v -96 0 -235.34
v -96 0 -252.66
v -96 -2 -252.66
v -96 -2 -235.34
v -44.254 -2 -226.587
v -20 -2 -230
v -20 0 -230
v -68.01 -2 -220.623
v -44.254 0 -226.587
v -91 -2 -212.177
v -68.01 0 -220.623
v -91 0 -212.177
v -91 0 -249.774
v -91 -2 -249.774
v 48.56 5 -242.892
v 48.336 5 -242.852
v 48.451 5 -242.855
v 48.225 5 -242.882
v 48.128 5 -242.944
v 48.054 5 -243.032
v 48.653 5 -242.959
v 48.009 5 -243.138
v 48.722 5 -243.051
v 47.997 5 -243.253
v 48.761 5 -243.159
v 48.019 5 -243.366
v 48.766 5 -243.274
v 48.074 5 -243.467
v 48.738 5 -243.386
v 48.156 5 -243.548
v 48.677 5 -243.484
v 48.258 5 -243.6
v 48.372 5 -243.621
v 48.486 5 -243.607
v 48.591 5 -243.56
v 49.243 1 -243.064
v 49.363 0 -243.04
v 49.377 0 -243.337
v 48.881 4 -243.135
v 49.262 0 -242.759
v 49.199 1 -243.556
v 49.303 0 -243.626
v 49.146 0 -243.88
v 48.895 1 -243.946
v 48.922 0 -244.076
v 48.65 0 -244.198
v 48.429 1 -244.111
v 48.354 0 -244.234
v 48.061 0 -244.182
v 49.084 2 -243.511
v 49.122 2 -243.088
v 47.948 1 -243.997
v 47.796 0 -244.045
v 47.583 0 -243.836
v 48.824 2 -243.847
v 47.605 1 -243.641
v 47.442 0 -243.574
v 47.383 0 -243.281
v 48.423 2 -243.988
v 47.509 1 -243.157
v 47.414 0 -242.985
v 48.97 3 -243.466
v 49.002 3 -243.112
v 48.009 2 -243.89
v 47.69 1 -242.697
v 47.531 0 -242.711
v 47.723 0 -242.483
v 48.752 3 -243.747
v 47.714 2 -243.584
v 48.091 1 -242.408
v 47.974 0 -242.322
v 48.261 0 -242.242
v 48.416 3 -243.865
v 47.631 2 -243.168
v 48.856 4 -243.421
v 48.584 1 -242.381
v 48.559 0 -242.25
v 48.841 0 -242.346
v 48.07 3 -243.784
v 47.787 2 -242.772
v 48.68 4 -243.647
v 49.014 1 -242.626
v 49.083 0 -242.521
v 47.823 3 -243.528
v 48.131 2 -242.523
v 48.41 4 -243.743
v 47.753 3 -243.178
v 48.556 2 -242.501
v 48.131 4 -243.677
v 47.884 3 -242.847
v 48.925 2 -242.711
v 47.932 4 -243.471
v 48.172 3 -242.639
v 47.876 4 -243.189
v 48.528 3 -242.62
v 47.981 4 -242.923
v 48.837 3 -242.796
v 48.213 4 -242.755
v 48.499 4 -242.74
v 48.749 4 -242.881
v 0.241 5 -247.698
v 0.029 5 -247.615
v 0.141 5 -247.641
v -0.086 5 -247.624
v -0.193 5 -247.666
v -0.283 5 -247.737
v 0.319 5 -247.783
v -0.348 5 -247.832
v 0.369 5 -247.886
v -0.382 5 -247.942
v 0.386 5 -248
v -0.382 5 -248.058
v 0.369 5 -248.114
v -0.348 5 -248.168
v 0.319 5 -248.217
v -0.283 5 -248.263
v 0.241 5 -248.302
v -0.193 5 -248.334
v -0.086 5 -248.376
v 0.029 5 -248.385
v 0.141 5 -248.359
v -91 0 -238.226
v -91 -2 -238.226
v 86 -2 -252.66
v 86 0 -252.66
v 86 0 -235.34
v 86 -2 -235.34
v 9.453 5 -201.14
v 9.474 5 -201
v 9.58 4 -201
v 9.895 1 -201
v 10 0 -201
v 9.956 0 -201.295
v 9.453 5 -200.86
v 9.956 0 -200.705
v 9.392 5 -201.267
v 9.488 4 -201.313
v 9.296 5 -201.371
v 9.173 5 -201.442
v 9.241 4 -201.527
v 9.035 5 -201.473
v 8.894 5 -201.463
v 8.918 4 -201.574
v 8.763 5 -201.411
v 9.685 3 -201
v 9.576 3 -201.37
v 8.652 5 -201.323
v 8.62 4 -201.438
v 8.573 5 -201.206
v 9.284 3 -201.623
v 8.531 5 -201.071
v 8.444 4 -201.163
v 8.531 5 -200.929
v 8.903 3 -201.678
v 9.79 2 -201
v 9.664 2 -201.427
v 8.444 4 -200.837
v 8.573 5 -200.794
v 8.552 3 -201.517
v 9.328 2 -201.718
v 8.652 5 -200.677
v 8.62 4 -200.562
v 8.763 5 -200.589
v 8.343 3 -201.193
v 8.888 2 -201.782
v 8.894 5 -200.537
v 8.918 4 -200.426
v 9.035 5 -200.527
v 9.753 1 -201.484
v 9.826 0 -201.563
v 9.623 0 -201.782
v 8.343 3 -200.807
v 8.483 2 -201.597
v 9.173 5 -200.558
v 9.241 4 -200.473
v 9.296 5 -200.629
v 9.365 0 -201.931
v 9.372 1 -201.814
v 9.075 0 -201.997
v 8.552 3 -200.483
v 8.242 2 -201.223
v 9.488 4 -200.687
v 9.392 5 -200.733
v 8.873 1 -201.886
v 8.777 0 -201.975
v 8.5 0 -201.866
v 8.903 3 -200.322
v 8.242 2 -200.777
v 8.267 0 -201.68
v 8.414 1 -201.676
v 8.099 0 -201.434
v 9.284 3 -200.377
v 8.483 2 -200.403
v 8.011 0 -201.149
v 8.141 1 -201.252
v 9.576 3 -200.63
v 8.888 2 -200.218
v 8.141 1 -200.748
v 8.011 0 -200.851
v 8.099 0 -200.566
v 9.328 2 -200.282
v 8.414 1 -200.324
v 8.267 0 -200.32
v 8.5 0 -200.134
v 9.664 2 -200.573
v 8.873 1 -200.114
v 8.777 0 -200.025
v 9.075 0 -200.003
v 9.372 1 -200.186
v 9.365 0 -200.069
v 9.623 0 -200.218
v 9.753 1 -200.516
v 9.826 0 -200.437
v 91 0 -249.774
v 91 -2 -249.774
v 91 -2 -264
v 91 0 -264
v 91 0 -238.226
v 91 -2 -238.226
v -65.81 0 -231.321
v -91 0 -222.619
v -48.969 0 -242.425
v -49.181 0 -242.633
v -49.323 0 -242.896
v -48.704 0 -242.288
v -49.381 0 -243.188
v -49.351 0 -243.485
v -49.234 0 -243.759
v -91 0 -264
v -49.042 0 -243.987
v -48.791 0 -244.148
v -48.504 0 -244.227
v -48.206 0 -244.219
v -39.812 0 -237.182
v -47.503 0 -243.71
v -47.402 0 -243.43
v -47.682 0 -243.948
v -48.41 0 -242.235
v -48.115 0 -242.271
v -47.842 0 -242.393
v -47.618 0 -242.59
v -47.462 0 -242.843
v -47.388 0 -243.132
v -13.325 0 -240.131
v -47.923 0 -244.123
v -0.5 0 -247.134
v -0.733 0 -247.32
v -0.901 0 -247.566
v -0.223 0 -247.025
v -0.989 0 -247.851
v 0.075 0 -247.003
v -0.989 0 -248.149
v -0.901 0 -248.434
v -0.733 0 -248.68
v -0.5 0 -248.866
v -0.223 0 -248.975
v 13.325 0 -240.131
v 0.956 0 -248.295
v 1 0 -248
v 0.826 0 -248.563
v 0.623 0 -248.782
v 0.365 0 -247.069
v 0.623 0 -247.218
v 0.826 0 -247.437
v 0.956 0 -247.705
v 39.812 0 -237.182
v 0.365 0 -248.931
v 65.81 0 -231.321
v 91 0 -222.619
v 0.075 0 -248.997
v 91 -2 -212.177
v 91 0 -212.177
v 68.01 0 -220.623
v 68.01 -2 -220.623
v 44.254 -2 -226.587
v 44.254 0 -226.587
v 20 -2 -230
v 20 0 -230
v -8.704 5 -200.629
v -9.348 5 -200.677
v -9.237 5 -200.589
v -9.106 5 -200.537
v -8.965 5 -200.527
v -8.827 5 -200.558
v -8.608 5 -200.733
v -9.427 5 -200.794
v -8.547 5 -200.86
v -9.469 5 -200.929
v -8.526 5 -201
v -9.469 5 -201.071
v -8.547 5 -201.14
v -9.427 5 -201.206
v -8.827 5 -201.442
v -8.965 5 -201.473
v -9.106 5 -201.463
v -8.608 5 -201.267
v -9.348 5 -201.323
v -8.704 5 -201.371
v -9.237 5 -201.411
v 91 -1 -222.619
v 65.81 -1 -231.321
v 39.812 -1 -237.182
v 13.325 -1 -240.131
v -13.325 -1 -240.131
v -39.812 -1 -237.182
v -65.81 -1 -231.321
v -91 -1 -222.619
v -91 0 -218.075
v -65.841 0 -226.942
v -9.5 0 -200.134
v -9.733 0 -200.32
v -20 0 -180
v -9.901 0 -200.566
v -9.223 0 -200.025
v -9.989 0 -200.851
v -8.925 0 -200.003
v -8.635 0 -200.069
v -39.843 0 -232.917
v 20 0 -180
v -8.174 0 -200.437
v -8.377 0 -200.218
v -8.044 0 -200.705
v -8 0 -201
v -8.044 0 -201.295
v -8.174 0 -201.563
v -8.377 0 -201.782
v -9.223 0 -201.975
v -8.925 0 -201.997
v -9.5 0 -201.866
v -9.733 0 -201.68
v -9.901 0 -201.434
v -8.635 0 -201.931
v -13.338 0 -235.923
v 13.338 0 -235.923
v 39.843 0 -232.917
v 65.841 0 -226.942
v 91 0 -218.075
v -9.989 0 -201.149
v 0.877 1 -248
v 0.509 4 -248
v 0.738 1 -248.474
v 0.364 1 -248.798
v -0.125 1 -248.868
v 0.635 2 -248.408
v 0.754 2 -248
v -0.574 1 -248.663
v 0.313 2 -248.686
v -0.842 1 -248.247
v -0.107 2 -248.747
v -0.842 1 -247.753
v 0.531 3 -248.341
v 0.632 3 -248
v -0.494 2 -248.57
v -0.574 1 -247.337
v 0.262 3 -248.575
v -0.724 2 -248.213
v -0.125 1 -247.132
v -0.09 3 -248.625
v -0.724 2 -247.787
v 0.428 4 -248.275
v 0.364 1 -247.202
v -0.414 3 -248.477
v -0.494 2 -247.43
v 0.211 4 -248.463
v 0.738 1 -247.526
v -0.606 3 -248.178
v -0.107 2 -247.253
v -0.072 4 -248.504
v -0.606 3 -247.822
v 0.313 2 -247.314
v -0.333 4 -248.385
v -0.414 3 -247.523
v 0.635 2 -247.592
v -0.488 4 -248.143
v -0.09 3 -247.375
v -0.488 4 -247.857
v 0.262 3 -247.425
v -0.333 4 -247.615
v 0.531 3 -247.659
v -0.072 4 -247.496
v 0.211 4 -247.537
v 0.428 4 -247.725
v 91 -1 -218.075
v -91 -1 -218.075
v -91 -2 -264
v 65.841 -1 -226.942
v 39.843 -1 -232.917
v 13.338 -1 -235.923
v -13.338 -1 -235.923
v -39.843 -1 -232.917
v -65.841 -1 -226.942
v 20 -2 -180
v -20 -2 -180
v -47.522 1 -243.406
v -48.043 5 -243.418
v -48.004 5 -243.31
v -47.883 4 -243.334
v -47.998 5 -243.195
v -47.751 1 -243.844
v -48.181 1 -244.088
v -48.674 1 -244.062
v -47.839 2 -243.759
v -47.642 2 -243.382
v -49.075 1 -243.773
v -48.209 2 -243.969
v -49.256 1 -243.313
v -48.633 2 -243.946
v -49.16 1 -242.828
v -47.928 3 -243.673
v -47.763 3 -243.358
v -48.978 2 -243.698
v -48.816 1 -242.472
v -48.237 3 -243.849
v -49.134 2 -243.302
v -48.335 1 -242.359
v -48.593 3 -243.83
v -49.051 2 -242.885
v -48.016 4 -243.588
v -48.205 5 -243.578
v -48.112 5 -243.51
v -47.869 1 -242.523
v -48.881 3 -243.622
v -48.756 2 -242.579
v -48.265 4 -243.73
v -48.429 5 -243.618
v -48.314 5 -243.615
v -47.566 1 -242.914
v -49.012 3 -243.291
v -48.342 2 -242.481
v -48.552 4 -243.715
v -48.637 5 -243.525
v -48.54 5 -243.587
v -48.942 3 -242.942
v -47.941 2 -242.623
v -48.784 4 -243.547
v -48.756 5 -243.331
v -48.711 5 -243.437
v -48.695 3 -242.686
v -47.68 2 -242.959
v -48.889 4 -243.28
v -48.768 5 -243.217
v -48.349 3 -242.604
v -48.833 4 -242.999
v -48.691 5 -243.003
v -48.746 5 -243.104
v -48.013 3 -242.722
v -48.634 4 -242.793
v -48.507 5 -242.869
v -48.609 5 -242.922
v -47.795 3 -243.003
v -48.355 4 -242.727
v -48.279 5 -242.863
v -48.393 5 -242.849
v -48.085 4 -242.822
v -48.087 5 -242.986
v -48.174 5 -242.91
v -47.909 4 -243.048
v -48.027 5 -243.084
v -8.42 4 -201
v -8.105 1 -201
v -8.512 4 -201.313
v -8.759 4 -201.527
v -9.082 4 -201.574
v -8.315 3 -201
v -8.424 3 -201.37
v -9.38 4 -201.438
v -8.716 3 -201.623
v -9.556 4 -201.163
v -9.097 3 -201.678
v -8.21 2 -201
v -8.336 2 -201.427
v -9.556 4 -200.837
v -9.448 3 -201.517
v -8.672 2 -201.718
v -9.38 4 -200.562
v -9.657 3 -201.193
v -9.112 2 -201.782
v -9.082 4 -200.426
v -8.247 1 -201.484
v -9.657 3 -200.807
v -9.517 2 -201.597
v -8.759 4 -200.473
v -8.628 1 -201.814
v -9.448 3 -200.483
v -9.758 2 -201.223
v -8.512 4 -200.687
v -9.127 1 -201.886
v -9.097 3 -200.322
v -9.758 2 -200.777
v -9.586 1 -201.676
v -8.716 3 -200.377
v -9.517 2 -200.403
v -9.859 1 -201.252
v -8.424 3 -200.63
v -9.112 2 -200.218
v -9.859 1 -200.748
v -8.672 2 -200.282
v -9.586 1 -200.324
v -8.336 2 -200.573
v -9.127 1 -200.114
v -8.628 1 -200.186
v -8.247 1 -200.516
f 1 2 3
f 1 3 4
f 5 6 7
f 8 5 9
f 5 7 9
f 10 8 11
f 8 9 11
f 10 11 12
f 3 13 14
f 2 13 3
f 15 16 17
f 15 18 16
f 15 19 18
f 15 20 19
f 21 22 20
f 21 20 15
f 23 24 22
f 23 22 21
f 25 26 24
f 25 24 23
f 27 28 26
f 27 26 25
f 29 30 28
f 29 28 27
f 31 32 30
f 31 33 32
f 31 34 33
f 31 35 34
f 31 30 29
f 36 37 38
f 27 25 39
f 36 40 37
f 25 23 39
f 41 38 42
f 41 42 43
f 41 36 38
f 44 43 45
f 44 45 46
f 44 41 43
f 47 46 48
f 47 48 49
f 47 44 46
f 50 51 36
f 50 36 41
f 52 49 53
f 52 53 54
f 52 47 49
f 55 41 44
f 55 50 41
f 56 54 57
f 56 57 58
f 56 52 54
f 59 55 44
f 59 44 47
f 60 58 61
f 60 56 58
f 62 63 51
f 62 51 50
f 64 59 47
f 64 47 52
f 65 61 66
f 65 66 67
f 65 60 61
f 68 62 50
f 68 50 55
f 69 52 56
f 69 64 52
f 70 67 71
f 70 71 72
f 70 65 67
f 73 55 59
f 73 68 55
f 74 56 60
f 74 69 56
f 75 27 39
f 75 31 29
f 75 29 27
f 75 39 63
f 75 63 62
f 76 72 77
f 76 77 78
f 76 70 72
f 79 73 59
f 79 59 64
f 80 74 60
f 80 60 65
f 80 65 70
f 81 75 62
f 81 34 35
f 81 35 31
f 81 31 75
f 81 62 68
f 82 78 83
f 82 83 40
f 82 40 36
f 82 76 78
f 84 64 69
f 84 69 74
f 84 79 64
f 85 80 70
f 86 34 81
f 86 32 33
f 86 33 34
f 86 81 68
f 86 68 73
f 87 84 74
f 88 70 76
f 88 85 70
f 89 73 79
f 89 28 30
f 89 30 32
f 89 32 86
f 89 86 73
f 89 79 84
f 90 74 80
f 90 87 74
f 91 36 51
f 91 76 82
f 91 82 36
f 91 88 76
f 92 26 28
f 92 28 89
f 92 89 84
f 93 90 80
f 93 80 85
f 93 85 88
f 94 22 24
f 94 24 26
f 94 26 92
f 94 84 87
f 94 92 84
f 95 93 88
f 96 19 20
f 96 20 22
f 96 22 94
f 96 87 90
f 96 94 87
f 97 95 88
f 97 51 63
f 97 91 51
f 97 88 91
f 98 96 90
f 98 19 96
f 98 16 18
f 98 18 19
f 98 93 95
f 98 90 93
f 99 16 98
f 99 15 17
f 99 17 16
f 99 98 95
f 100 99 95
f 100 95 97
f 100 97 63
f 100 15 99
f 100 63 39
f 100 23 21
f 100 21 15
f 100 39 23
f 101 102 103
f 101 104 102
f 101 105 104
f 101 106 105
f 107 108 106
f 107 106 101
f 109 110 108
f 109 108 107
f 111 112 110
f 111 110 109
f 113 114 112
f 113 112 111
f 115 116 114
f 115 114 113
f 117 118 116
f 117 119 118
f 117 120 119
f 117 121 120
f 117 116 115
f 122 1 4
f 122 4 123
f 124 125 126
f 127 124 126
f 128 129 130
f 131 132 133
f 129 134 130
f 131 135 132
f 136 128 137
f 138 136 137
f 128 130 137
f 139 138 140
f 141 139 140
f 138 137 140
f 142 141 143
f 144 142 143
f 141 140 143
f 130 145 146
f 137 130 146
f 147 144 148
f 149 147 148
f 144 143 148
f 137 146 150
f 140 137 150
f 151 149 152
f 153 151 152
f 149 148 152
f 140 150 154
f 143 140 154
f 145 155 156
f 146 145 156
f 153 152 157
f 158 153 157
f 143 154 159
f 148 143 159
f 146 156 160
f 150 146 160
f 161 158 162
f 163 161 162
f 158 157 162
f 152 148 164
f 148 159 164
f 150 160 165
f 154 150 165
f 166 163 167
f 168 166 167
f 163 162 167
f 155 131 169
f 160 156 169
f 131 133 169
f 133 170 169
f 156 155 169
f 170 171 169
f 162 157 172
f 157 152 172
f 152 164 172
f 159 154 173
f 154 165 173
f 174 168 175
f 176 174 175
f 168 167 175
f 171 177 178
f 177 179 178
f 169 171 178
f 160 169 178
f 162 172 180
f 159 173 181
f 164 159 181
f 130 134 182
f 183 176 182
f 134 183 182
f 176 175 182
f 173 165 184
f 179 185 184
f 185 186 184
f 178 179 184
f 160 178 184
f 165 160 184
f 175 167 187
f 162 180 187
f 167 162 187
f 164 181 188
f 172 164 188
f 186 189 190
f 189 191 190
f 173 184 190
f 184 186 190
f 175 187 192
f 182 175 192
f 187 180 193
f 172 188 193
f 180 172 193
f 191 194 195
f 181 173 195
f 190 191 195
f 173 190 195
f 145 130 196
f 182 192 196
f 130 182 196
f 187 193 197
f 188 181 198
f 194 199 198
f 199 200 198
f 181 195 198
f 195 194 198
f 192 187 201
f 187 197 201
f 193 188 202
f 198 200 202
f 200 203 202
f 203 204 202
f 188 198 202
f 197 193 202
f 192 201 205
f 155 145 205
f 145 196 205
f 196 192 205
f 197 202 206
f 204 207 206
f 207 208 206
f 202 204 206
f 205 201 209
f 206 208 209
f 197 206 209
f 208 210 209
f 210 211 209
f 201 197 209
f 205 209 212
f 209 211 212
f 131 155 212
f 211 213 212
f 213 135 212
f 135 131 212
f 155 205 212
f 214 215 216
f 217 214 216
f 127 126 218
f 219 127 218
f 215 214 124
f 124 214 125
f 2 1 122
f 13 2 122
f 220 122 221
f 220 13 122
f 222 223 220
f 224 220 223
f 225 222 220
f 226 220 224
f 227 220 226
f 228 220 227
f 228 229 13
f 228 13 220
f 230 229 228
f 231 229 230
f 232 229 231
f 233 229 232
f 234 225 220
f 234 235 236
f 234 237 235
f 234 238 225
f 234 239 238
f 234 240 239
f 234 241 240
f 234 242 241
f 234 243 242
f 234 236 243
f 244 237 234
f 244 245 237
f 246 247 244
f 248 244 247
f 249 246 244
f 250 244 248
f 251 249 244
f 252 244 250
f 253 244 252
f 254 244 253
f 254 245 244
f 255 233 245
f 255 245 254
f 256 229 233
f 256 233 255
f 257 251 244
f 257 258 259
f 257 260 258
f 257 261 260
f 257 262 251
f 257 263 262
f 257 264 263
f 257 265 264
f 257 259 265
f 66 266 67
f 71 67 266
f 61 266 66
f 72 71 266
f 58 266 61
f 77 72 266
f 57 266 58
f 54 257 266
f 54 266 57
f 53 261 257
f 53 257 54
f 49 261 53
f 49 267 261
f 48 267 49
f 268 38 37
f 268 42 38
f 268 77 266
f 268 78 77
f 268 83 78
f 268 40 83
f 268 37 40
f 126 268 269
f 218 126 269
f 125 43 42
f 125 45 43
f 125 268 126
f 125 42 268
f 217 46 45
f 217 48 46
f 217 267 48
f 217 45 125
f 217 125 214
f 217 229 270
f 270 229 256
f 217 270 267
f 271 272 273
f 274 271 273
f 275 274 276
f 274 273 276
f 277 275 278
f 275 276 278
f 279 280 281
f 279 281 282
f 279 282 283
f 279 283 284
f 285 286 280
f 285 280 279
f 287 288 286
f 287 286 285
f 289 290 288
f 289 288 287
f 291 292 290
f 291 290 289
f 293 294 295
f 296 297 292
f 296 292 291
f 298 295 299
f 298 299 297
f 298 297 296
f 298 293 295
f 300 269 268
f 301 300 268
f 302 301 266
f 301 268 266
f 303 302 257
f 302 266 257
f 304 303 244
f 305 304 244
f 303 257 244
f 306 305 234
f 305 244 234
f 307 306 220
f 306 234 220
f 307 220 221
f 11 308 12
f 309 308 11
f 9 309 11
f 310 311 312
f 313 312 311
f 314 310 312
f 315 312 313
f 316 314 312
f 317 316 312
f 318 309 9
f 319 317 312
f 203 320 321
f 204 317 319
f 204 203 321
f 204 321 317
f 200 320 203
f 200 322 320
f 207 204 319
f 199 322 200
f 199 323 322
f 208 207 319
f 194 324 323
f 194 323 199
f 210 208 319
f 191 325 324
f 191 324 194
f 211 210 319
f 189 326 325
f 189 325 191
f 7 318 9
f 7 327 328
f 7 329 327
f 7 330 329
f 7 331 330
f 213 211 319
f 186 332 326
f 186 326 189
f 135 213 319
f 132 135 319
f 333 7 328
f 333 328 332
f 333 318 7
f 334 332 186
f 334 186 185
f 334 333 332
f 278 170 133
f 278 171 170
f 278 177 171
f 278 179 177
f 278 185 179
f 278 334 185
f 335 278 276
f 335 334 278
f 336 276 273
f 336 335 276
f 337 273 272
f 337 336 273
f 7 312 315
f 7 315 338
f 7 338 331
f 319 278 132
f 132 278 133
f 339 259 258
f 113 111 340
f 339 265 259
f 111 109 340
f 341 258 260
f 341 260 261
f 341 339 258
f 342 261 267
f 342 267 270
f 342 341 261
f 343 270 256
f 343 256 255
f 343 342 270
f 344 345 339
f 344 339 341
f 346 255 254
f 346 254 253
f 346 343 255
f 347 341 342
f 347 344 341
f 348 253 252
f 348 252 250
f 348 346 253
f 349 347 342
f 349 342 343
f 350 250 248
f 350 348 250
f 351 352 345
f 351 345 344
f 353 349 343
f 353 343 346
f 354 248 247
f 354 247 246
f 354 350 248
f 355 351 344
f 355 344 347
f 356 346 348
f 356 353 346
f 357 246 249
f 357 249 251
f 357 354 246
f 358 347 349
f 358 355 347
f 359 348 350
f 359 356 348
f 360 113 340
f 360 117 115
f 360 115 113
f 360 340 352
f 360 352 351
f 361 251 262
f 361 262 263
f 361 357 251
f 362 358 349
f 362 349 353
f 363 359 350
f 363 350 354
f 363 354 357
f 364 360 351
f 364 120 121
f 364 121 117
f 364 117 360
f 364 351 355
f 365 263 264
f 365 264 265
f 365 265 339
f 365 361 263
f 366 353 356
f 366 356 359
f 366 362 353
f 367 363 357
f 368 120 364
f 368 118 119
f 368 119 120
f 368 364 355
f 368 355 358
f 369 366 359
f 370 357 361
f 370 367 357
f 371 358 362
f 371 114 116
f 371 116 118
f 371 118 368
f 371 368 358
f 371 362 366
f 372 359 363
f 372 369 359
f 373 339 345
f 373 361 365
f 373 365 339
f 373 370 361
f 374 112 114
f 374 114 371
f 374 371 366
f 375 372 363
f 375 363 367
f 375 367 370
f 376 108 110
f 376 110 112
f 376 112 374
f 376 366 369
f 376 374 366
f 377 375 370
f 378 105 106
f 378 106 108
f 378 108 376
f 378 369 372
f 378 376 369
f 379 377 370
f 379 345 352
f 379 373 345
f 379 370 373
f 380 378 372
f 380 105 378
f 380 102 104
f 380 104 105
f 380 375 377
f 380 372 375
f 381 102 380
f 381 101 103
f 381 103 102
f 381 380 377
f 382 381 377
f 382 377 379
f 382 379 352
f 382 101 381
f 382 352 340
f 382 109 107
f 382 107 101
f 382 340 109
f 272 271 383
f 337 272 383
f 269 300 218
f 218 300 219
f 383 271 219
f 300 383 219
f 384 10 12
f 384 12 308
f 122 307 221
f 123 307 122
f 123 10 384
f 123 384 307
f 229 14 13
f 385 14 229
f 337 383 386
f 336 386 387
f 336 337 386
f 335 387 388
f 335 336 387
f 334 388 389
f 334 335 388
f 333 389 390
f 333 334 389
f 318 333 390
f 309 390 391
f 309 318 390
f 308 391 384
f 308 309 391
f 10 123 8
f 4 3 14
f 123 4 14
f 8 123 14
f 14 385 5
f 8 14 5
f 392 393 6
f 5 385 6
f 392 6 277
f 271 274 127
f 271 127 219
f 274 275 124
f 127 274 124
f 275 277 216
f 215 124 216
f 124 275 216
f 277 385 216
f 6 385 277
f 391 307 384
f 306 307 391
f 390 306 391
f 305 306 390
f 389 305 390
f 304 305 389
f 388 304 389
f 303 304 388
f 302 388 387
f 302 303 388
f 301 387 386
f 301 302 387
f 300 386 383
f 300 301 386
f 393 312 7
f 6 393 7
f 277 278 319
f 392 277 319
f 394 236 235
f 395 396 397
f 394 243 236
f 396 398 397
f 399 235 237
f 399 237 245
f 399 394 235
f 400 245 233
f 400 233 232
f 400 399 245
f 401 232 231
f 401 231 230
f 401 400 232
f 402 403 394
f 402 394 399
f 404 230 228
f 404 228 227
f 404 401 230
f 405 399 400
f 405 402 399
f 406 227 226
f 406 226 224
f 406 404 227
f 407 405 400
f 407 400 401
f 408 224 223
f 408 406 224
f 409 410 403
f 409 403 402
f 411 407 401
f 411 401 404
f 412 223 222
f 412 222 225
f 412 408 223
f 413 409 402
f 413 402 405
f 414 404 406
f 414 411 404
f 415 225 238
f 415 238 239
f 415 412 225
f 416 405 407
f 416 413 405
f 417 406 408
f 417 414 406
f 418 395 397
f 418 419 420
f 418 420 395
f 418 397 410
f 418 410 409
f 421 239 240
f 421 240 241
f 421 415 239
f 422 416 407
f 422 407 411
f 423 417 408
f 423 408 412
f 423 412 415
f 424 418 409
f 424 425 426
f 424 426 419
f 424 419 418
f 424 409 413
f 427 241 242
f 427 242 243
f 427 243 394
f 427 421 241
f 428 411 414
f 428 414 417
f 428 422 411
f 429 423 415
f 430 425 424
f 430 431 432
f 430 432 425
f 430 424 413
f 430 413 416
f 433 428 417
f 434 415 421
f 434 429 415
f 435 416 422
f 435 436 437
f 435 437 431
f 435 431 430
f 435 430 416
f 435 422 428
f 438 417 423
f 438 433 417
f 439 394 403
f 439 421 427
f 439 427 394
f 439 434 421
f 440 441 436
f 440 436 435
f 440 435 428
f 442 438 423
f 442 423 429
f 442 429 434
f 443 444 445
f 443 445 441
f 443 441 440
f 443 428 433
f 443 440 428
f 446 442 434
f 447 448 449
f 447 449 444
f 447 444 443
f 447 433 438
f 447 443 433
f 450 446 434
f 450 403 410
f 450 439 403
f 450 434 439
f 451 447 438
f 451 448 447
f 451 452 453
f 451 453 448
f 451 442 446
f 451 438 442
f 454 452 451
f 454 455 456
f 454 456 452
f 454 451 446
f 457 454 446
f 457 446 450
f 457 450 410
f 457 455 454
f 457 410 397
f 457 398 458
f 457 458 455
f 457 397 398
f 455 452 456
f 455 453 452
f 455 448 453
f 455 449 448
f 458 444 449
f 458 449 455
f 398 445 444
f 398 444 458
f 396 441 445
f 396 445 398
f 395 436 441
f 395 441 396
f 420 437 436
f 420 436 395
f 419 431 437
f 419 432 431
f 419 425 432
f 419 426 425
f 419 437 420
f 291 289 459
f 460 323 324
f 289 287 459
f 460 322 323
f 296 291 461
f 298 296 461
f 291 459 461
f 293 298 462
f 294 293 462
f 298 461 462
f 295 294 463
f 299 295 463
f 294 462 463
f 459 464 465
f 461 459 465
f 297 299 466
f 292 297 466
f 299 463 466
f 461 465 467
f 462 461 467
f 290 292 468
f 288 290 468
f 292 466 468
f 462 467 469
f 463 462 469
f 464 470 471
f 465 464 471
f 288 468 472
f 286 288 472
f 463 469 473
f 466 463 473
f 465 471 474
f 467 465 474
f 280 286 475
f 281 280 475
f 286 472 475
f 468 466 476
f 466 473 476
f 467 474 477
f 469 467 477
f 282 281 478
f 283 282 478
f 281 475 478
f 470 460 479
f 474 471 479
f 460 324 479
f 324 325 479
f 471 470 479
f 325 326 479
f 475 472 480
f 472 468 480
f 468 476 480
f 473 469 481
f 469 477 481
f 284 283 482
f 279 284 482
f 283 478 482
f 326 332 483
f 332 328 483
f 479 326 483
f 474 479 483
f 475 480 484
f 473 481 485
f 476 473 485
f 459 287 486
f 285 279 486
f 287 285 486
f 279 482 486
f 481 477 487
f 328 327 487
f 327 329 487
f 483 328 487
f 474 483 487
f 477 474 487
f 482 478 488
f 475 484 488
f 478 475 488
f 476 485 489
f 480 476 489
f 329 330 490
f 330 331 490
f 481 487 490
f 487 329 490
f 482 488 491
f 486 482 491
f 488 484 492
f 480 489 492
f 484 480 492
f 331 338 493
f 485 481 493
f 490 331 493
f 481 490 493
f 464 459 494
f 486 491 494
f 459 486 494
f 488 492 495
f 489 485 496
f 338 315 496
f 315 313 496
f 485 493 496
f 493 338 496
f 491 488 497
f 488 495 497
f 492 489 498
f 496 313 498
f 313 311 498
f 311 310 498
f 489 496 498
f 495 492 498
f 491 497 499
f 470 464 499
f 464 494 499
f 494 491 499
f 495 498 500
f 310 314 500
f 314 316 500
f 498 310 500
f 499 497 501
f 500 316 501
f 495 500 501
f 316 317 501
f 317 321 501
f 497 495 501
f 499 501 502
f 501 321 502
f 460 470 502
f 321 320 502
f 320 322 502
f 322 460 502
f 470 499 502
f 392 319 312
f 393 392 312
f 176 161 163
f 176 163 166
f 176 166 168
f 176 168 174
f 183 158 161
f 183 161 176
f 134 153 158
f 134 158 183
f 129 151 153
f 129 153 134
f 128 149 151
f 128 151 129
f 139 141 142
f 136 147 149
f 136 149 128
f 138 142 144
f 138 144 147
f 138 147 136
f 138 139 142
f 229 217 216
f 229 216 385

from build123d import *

# Parameters (mm, degrees)
BASEPLATE_PROFILE_DEPTH               = 2
SKETCH2_R                             = 1
M3_PINS_DEPTH                         = 5
M3_PINS_TAPER                         = 7
CIRPATTERN1_COUNT                     = 32
SKETCH4_R                             = 1
PILLAR_PINS_DEPTH                     = 5
PILLAR_PINS_DRAFT                     = 6
PILLAR_PINS_PROFILE_2_DEPTH           = 5
PILLAR_PINS_PROFILE_2_DRAFT           = 6
CIRPATTERN2_COPY_1_SKETCH_R           = 1
CIRPATTERN2_COPY_1_DEPTH              = 5
CIRPATTERN2_COPY_1_DRAFT              = 6
CIRPATTERN2_COPY_2_SKETCH_R           = 1
CIRPATTERN2_COPY_2_DEPTH              = 5
CIRPATTERN2_COPY_2_DRAFT              = 6
CIRPATTERN2_COPY_3_SKETCH_R           = 1
CIRPATTERN2_COPY_3_DEPTH              = 5
CIRPATTERN2_COPY_3_DRAFT              = 6
CIRPATTERN2_COPY_4_SKETCH_R           = 1
CIRPATTERN2_COPY_4_DEPTH              = 5
CIRPATTERN2_COPY_4_DRAFT              = 6
CIRPATTERN2_COPY_5_SKETCH_R           = 1
CIRPATTERN2_COPY_5_DEPTH              = 5
CIRPATTERN2_COPY_5_DRAFT              = 6
CIRPATTERN2_COPY_6_SKETCH_R           = 1
CIRPATTERN2_COPY_6_DEPTH              = 5
CIRPATTERN2_COPY_6_DRAFT              = 6
CIRPATTERN2_COPY_7_SKETCH_R           = 1
CIRPATTERN2_COPY_7_DEPTH              = 5
CIRPATTERN2_COPY_7_DRAFT              = 6
CIRPATTERN2_COPY_8_SKETCH_R           = 1
CIRPATTERN2_COPY_8_DEPTH              = 5
CIRPATTERN2_COPY_8_DRAFT              = 6
CIRPATTERN2_COPY_9_SKETCH_R           = 1
CIRPATTERN2_COPY_9_DEPTH              = 5
CIRPATTERN2_COPY_9_DRAFT              = 6
CIRPATTERN2_COPY_10_SKETCH_R          = 1
CIRPATTERN2_COPY_10_DEPTH             = 5
CIRPATTERN2_COPY_10_DRAFT             = 6
CIRPATTERN2_COPY_11_SKETCH_R          = 1
CIRPATTERN2_COPY_11_DEPTH             = 5
CIRPATTERN2_COPY_11_DRAFT             = 6
CIRPATTERN2_COPY_12_SKETCH_R          = 1
CIRPATTERN2_COPY_12_DEPTH             = 5
CIRPATTERN2_COPY_12_DRAFT             = 6
CIRPATTERN2_COPY_13_SKETCH_R          = 1
CIRPATTERN2_COPY_13_DEPTH             = 5
CIRPATTERN2_COPY_13_DRAFT             = 6
CIRPATTERN2_COPY_14_SKETCH_R          = 1
CIRPATTERN2_COPY_14_DEPTH             = 5
CIRPATTERN2_COPY_14_DRAFT             = 6
CIRPATTERN2_COPY_15_SKETCH_R          = 1
CIRPATTERN2_COPY_15_DEPTH             = 5
CIRPATTERN2_COPY_15_DRAFT             = 6
SKETCH5_R                             = 3
M8_HOLE_1_DEPTH                       = 5
M8_HOLE_1_TAPER                       = 12
M8_1_PATTERN_COUNT                    = 4
SKETCH6_R                             = 3
EXTRUDE_M8_2_DEPTH                    = 5
EXTRUDE_M8_2_TAPER                    = 12
M8_2_PATTERN_COUNT                    = 4
PATTERN_CIRCULAR_M8_3_COUNT           = 2
PATTERN_CIRCULAR_M8_3_ANGLE           = 36.9
PATTERN_CIRCULAR_M8_3_COPY_1_SKETCH_R = 3
PATTERN_CIRCULAR_M8_3_COPY_1_DEPTH    = 5
PATTERN_CIRCULAR_M8_3_COPY_1_TAPER    = 12
PATTERN_CIRCULAR_M8_3_COPY_2_SKETCH_R = 3
PATTERN_CIRCULAR_M8_3_COPY_2_DEPTH    = 5
PATTERN_CIRCULAR_M8_3_COPY_2_TAPER    = 12
PATTERN_CIRCULAR_M8_3_COPY_3_SKETCH_R = 3
PATTERN_CIRCULAR_M8_3_COPY_3_DEPTH    = 5
PATTERN_CIRCULAR_M8_3_COPY_3_TAPER    = 12
CUT_CENTER_DEPTH                      = 374.385859402
CIRPATTERN7_COUNT                     = 6
SKETCH15_W                            = 794.241353176
SKETCH15_H                            = 757.161766401
SKETCH15_W_2                          = 182
SKETCH15_H_2                          = 180
CUT_EXTRUDE3_DEPTH                    = 374.417996354
BOSS_EXTRUDE2_DEPTH                   = 2
CUT_EXTRUDE4_DEPTH                    = 281.95729213
SKETCH18_R                            = 240.5
SKETCH18_R_2                          = 236.3
CUT_EXTRUDE5_DEPTH                    = 1


with BuildPart() as part:
    # Sketch1 → baseplate profile (new body)
    with BuildSketch(Plane(origin=(0, 0, 0), x_dir=(1, 0, 0), z_dir=(0, 1, 0))):
        Polygon((264, 0), (264, 131.98), (131.979594929, 264), (0, 264), (-131.98, 264), (-264, 131.979594929), (-264, 0), (-264, -131.98), (-131.979594929, -264), (0, -264), (131.98, -264), (264, -131.979594929), align=None)
    extrude(amount=-BASEPLATE_PROFILE_DEPTH)

    # Sketch2 → M3 pins (add)
    with BuildSketch(Plane(origin=(0, 0, 0), x_dir=(1, 0, 0), z_dir=(0, 1, 0))):
        with Locations((0, 248)):
            Circle(SKETCH2_R)
    m3_pins = extrude(amount=M3_PINS_DEPTH, taper=M3_PINS_TAPER)

    # CirPattern1: M3 pins ×32 about axis
    cirpattern1_axis = Axis((0, 0, 0), (0, 1, 0))
    for i in range(1, CIRPATTERN1_COUNT):
        add(m3_pins.rotate(cirpattern1_axis, i * 360 / CIRPATTERN1_COUNT))


with BuildPart() as pillar_pins_tool:
    # Sketch4 → pillar pins (with draft: the straight prism first)
    with BuildSketch(Plane(origin=(0, 0, 0), x_dir=(1, 0, 0), z_dir=(0, 1, 0))):
        with Locations((9, 201)):
            Circle(SKETCH4_R)
    extrude(amount=PILLAR_PINS_DEPTH)
    # pillar pins: the draft: its side faces are tilted about the plane it starts from
    pillar_pins_sides = [pillar_pins_tool.faces().sort_by_distance(p)[0] for p in [
        (8, 2.5, -201),
    ]]
    draft(pillar_pins_sides, Plane(origin=(0, 0, 0), x_dir=(1, 0, 0), z_dir=(0, 1, 0)), PILLAR_PINS_DRAFT)


with BuildPart() as part_1:
    add(part.part)

    # pillar pins: add pillar_pins_tool
    add(pillar_pins_tool.part)


with BuildPart() as pillar_pins_profile_2_tool:
    # Sketch4 → pillar pins profile 2 (with draft: the straight prism first)
    with BuildSketch(Plane(origin=(0, 0, 0), x_dir=(1, 0, 0), z_dir=(0, 1, 0))):
        with Locations((-9, 201)):
            Circle(SKETCH4_R)
    extrude(amount=PILLAR_PINS_PROFILE_2_DEPTH)
    # pillar pins profile 2: the draft: its side faces are tilted about the plane it starts from
    pillar_pins_profile_2_sides = [pillar_pins_profile_2_tool.faces().sort_by_distance(p)[0] for p in [
        (-10, 2.5, -201),
    ]]
    draft(pillar_pins_profile_2_sides, Plane(origin=(0, 0, 0), x_dir=(1, 0, 0), z_dir=(0, 1, 0)), PILLAR_PINS_PROFILE_2_DRAFT)


with BuildPart() as part_2:
    add(part_1.part)

    # pillar pins profile 2: add pillar_pins_profile_2_tool
    add(pillar_pins_profile_2_tool.part)


with BuildPart() as cirpattern2_copy_1_tool:
    # CirPattern2 copy 1 sketch → CirPattern2 copy 1 (with draft: the straight prism first)
    with BuildSketch(Plane(origin=(0, 0, 0), x_dir=(0.5000000000000001, 0, -0.8660254037844386), z_dir=(0, 1, 0))):
        with Locations((9, 201)):
            Circle(CIRPATTERN2_COPY_1_SKETCH_R)
    extrude(amount=CIRPATTERN2_COPY_1_DEPTH)
    # CirPattern2 copy 1: the draft: its side faces are tilted about the plane it starts from
    cirpattern2_copy_1_sides = [cirpattern2_copy_1_tool.faces().sort_by_distance(p)[0] for p in [
        (-170.071106161, 2.5, -107.42820323),
    ]]
    draft(cirpattern2_copy_1_sides, Plane(origin=(0, 0, 0), x_dir=(0.5000000000000001, 0, -0.8660254037844386), z_dir=(0, 1, 0)), CIRPATTERN2_COPY_1_DRAFT)


with BuildPart() as part_3:
    add(part_2.part)

    # CirPattern2 copy 1: add cirpattern2_copy_1_tool
    add(cirpattern2_copy_1_tool.part)


with BuildPart() as cirpattern2_copy_2_tool:
    # CirPattern2 copy 2 sketch → CirPattern2 copy 2 (with draft: the straight prism first)
    with BuildSketch(Plane(origin=(0, 0, 0), x_dir=(-0.4999999999999998, 0, -0.8660254037844387), z_dir=(0, 1, 0))):
        with Locations((9, 201)):
            Circle(CIRPATTERN2_COPY_2_SKETCH_R)
    extrude(amount=CIRPATTERN2_COPY_2_DEPTH)
    # CirPattern2 copy 2: the draft: its side faces are tilted about the plane it starts from
    cirpattern2_copy_2_sides = [cirpattern2_copy_2_tool.faces().sort_by_distance(p)[0] for p in [
        (-178.071106161, 2.5, 93.57179677),
    ]]
    draft(cirpattern2_copy_2_sides, Plane(origin=(0, 0, 0), x_dir=(-0.4999999999999998, 0, -0.8660254037844387), z_dir=(0, 1, 0)), CIRPATTERN2_COPY_2_DRAFT)


with BuildPart() as part_4:
    add(part_3.part)

    # CirPattern2 copy 2: add cirpattern2_copy_2_tool
    add(cirpattern2_copy_2_tool.part)


with BuildPart() as cirpattern2_copy_3_tool:
    # CirPattern2 copy 3 sketch → CirPattern2 copy 3 (with draft: the straight prism first)
    with BuildSketch(Plane(origin=(0, 0, 0), x_dir=(-1, 0, 0), z_dir=(0, 1, 0))):
        with Locations((9, 201)):
            Circle(CIRPATTERN2_COPY_3_SKETCH_R)
    extrude(amount=CIRPATTERN2_COPY_3_DEPTH)
    # CirPattern2 copy 3: the draft: its side faces are tilted about the plane it starts from
    cirpattern2_copy_3_sides = [cirpattern2_copy_3_tool.faces().sort_by_distance(p)[0] for p in [
        (-8, 2.5, 201),
    ]]
    draft(cirpattern2_copy_3_sides, Plane(origin=(0, 0, 0), x_dir=(-1, 0, 0), z_dir=(0, 1, 0)), CIRPATTERN2_COPY_3_DRAFT)


with BuildPart() as part_5:
    add(part_4.part)

    # CirPattern2 copy 3: add cirpattern2_copy_3_tool
    add(cirpattern2_copy_3_tool.part)


with BuildPart() as cirpattern2_copy_4_tool:
    # CirPattern2 copy 4 sketch → CirPattern2 copy 4 (with draft: the straight prism first)
    with BuildSketch(Plane(origin=(0, 0, 0), x_dir=(-0.5000000000000004, 0, 0.8660254037844384), z_dir=(0, 1, 0))):
        with Locations((9, 201)):
            Circle(CIRPATTERN2_COPY_4_SKETCH_R)
    extrude(amount=CIRPATTERN2_COPY_4_DEPTH)
    # CirPattern2 copy 4: the draft: its side faces are tilted about the plane it starts from
    cirpattern2_copy_4_sides = [cirpattern2_copy_4_tool.faces().sort_by_distance(p)[0] for p in [
        (170.071106161, 2.5, 107.42820323),
    ]]
    draft(cirpattern2_copy_4_sides, Plane(origin=(0, 0, 0), x_dir=(-0.5000000000000004, 0, 0.8660254037844384), z_dir=(0, 1, 0)), CIRPATTERN2_COPY_4_DRAFT)


with BuildPart() as part_6:
    add(part_5.part)

    # CirPattern2 copy 4: add cirpattern2_copy_4_tool
    add(cirpattern2_copy_4_tool.part)


with BuildPart() as cirpattern2_copy_5_tool:
    # CirPattern2 copy 5 sketch → CirPattern2 copy 5 (with draft: the straight prism first)
    with BuildSketch(Plane(origin=(0, 0, 0), x_dir=(0.5000000000000001, 0, 0.8660254037844386), z_dir=(0, 1, 0))):
        with Locations((9, 201)):
            Circle(CIRPATTERN2_COPY_5_SKETCH_R)
    extrude(amount=CIRPATTERN2_COPY_5_DEPTH)
    # CirPattern2 copy 5: the draft: its side faces are tilted about the plane it starts from
    cirpattern2_copy_5_sides = [cirpattern2_copy_5_tool.faces().sort_by_distance(p)[0] for p in [
        (178.071106161, 2.5, -93.57179677),
    ]]
    draft(cirpattern2_copy_5_sides, Plane(origin=(0, 0, 0), x_dir=(0.5000000000000001, 0, 0.8660254037844386), z_dir=(0, 1, 0)), CIRPATTERN2_COPY_5_DRAFT)


with BuildPart() as part_7:
    add(part_6.part)

    # CirPattern2 copy 5: add cirpattern2_copy_5_tool
    add(cirpattern2_copy_5_tool.part)


with BuildPart() as cirpattern2_copy_6_tool:
    # CirPattern2 copy 6 sketch → CirPattern2 copy 6 (with draft: the straight prism first)
    with BuildSketch(Plane(origin=(0, 0, 0), x_dir=(0.5000000000000001, 0, -0.8660254037844386), z_dir=(0, 1, 0))):
        with Locations((-9, 201)):
            Circle(CIRPATTERN2_COPY_6_SKETCH_R)
    extrude(amount=CIRPATTERN2_COPY_6_DEPTH)
    # CirPattern2 copy 6: the draft: its side faces are tilted about the plane it starts from
    cirpattern2_copy_6_sides = [cirpattern2_copy_6_tool.faces().sort_by_distance(p)[0] for p in [
        (-179.071106161, 2.5, -91.839745962),
    ]]
    draft(cirpattern2_copy_6_sides, Plane(origin=(0, 0, 0), x_dir=(0.5000000000000001, 0, -0.8660254037844386), z_dir=(0, 1, 0)), CIRPATTERN2_COPY_6_DRAFT)


with BuildPart() as part_8:
    add(part_7.part)

    # CirPattern2 copy 6: add cirpattern2_copy_6_tool
    add(cirpattern2_copy_6_tool.part)


with BuildPart() as cirpattern2_copy_7_tool:
    # CirPattern2 copy 7 sketch → CirPattern2 copy 7 (with draft: the straight prism first)
    with BuildSketch(Plane(origin=(0, 0, 0), x_dir=(-0.4999999999999998, 0, -0.8660254037844387), z_dir=(0, 1, 0))):
        with Locations((-9, 201)):
            Circle(CIRPATTERN2_COPY_7_SKETCH_R)
    extrude(amount=CIRPATTERN2_COPY_7_DEPTH)
    # CirPattern2 copy 7: the draft: its side faces are tilted about the plane it starts from
    cirpattern2_copy_7_sides = [cirpattern2_copy_7_tool.faces().sort_by_distance(p)[0] for p in [
        (-169.071106161, 2.5, 109.160254038),
    ]]
    draft(cirpattern2_copy_7_sides, Plane(origin=(0, 0, 0), x_dir=(-0.4999999999999998, 0, -0.8660254037844387), z_dir=(0, 1, 0)), CIRPATTERN2_COPY_7_DRAFT)


with BuildPart() as part_9:
    add(part_8.part)

    # CirPattern2 copy 7: add cirpattern2_copy_7_tool
    add(cirpattern2_copy_7_tool.part)


with BuildPart() as cirpattern2_copy_8_tool:
    # CirPattern2 copy 8 sketch → CirPattern2 copy 8 (with draft: the straight prism first)
    with BuildSketch(Plane(origin=(0, 0, 0), x_dir=(-1, 0, 0), z_dir=(0, 1, 0))):
        with Locations((-9, 201)):
            Circle(CIRPATTERN2_COPY_8_SKETCH_R)
    extrude(amount=CIRPATTERN2_COPY_8_DEPTH)
    # CirPattern2 copy 8: the draft: its side faces are tilted about the plane it starts from
    cirpattern2_copy_8_sides = [cirpattern2_copy_8_tool.faces().sort_by_distance(p)[0] for p in [
        (10, 2.5, 201),
    ]]
    draft(cirpattern2_copy_8_sides, Plane(origin=(0, 0, 0), x_dir=(-1, 0, 0), z_dir=(0, 1, 0)), CIRPATTERN2_COPY_8_DRAFT)


with BuildPart() as part_10:
    add(part_9.part)

    # CirPattern2 copy 8: add cirpattern2_copy_8_tool
    add(cirpattern2_copy_8_tool.part)


with BuildPart() as cirpattern2_copy_9_tool:
    # CirPattern2 copy 9 sketch → CirPattern2 copy 9 (with draft: the straight prism first)
    with BuildSketch(Plane(origin=(0, 0, 0), x_dir=(-0.5000000000000004, 0, 0.8660254037844384), z_dir=(0, 1, 0))):
        with Locations((-9, 201)):
            Circle(CIRPATTERN2_COPY_9_SKETCH_R)
    extrude(amount=CIRPATTERN2_COPY_9_DEPTH)
    # CirPattern2 copy 9: the draft: its side faces are tilted about the plane it starts from
    cirpattern2_copy_9_sides = [cirpattern2_copy_9_tool.faces().sort_by_distance(p)[0] for p in [
        (179.071106161, 2.5, 91.839745962),
    ]]
    draft(cirpattern2_copy_9_sides, Plane(origin=(0, 0, 0), x_dir=(-0.5000000000000004, 0, 0.8660254037844384), z_dir=(0, 1, 0)), CIRPATTERN2_COPY_9_DRAFT)


with BuildPart() as part_11:
    add(part_10.part)

    # CirPattern2 copy 9: add cirpattern2_copy_9_tool
    add(cirpattern2_copy_9_tool.part)


with BuildPart() as cirpattern2_copy_10_tool:
    # CirPattern2 copy 10 sketch → CirPattern2 copy 10 (with draft: the straight prism first)
    with BuildSketch(Plane(origin=(0, 0, 0), x_dir=(0.5000000000000001, 0, 0.8660254037844386), z_dir=(0, 1, 0))):
        with Locations((-9, 201)):
            Circle(CIRPATTERN2_COPY_10_SKETCH_R)
    extrude(amount=CIRPATTERN2_COPY_10_DEPTH)
    # CirPattern2 copy 10: the draft: its side faces are tilted about the plane it starts from
    cirpattern2_copy_10_sides = [cirpattern2_copy_10_tool.faces().sort_by_distance(p)[0] for p in [
        (169.071106161, 2.5, -109.160254038),
    ]]
    draft(cirpattern2_copy_10_sides, Plane(origin=(0, 0, 0), x_dir=(0.5000000000000001, 0, 0.8660254037844386), z_dir=(0, 1, 0)), CIRPATTERN2_COPY_10_DRAFT)


with BuildPart() as part_12:
    add(part_11.part)

    # CirPattern2 copy 10: add cirpattern2_copy_10_tool
    add(cirpattern2_copy_10_tool.part)


with BuildPart() as cirpattern2_copy_11_tool:
    # CirPattern2 copy 11 sketch → CirPattern2 copy 11 (with draft: the straight prism first)
    with BuildSketch(Plane(origin=(0, 0, 0), x_dir=(0.5000000000000001, 0, -0.8660254037844386), z_dir=(0, 1, 0))):
        with Locations((-9, 201)):
            Circle(CIRPATTERN2_COPY_11_SKETCH_R)
    extrude(amount=CIRPATTERN2_COPY_11_DEPTH)
    # CirPattern2 copy 11: the draft: its side faces are tilted about the plane it starts from
    cirpattern2_copy_11_sides = [cirpattern2_copy_11_tool.faces().sort_by_distance(p)[0] for p in [
        (-179.071106161, 2.5, -91.839745962),
    ]]
    draft(cirpattern2_copy_11_sides, Plane(origin=(0, 0, 0), x_dir=(0.5000000000000001, 0, -0.8660254037844386), z_dir=(0, 1, 0)), CIRPATTERN2_COPY_11_DRAFT)


with BuildPart() as part_13:
    add(part_12.part)

    # CirPattern2 copy 11: add cirpattern2_copy_11_tool
    add(cirpattern2_copy_11_tool.part)


with BuildPart() as cirpattern2_copy_12_tool:
    # CirPattern2 copy 12 sketch → CirPattern2 copy 12 (with draft: the straight prism first)
    with BuildSketch(Plane(origin=(0, 0, 0), x_dir=(-0.4999999999999998, 0, -0.8660254037844387), z_dir=(0, 1, 0))):
        with Locations((-9, 201)):
            Circle(CIRPATTERN2_COPY_12_SKETCH_R)
    extrude(amount=CIRPATTERN2_COPY_12_DEPTH)
    # CirPattern2 copy 12: the draft: its side faces are tilted about the plane it starts from
    cirpattern2_copy_12_sides = [cirpattern2_copy_12_tool.faces().sort_by_distance(p)[0] for p in [
        (-169.071106161, 2.5, 109.160254038),
    ]]
    draft(cirpattern2_copy_12_sides, Plane(origin=(0, 0, 0), x_dir=(-0.4999999999999998, 0, -0.8660254037844387), z_dir=(0, 1, 0)), CIRPATTERN2_COPY_12_DRAFT)


with BuildPart() as part_14:
    add(part_13.part)

    # CirPattern2 copy 12: add cirpattern2_copy_12_tool
    add(cirpattern2_copy_12_tool.part)


with BuildPart() as cirpattern2_copy_13_tool:
    # CirPattern2 copy 13 sketch → CirPattern2 copy 13 (with draft: the straight prism first)
    with BuildSketch(Plane(origin=(0, 0, 0), x_dir=(-1, 0, 0), z_dir=(0, 1, 0))):
        with Locations((-9, 201)):
            Circle(CIRPATTERN2_COPY_13_SKETCH_R)
    extrude(amount=CIRPATTERN2_COPY_13_DEPTH)
    # CirPattern2 copy 13: the draft: its side faces are tilted about the plane it starts from
    cirpattern2_copy_13_sides = [cirpattern2_copy_13_tool.faces().sort_by_distance(p)[0] for p in [
        (10, 2.5, 201),
    ]]
    draft(cirpattern2_copy_13_sides, Plane(origin=(0, 0, 0), x_dir=(-1, 0, 0), z_dir=(0, 1, 0)), CIRPATTERN2_COPY_13_DRAFT)


with BuildPart() as part_15:
    add(part_14.part)

    # CirPattern2 copy 13: add cirpattern2_copy_13_tool
    add(cirpattern2_copy_13_tool.part)


with BuildPart() as cirpattern2_copy_14_tool:
    # CirPattern2 copy 14 sketch → CirPattern2 copy 14 (with draft: the straight prism first)
    with BuildSketch(Plane(origin=(0, 0, 0), x_dir=(-0.5000000000000004, 0, 0.8660254037844384), z_dir=(0, 1, 0))):
        with Locations((-9, 201)):
            Circle(CIRPATTERN2_COPY_14_SKETCH_R)
    extrude(amount=CIRPATTERN2_COPY_14_DEPTH)
    # CirPattern2 copy 14: the draft: its side faces are tilted about the plane it starts from
    cirpattern2_copy_14_sides = [cirpattern2_copy_14_tool.faces().sort_by_distance(p)[0] for p in [
        (179.071106161, 2.5, 91.839745962),
    ]]
    draft(cirpattern2_copy_14_sides, Plane(origin=(0, 0, 0), x_dir=(-0.5000000000000004, 0, 0.8660254037844384), z_dir=(0, 1, 0)), CIRPATTERN2_COPY_14_DRAFT)


with BuildPart() as part_16:
    add(part_15.part)

    # CirPattern2 copy 14: add cirpattern2_copy_14_tool
    add(cirpattern2_copy_14_tool.part)


with BuildPart() as cirpattern2_copy_15_tool:
    # CirPattern2 copy 15 sketch → CirPattern2 copy 15 (with draft: the straight prism first)
    with BuildSketch(Plane(origin=(0, 0, 0), x_dir=(0.5000000000000001, 0, 0.8660254037844386), z_dir=(0, 1, 0))):
        with Locations((-9, 201)):
            Circle(CIRPATTERN2_COPY_15_SKETCH_R)
    extrude(amount=CIRPATTERN2_COPY_15_DEPTH)
    # CirPattern2 copy 15: the draft: its side faces are tilted about the plane it starts from
    cirpattern2_copy_15_sides = [cirpattern2_copy_15_tool.faces().sort_by_distance(p)[0] for p in [
        (169.071106161, 2.5, -109.160254038),
    ]]
    draft(cirpattern2_copy_15_sides, Plane(origin=(0, 0, 0), x_dir=(0.5000000000000001, 0, 0.8660254037844386), z_dir=(0, 1, 0)), CIRPATTERN2_COPY_15_DRAFT)


with BuildPart() as part_17:
    add(part_16.part)

    # CirPattern2 copy 15: add cirpattern2_copy_15_tool
    add(cirpattern2_copy_15_tool.part)

    # Sketch5 → M8 hole -1 (add)
    with BuildSketch(Plane(origin=(0, 0, 0), x_dir=(1, 0, 0), z_dir=(0, 1, 0))):
        with Locations((-193.040151264, 193.040151264)):
            Circle(SKETCH5_R)
    m8_hole_1 = extrude(amount=M8_HOLE_1_DEPTH, taper=M8_HOLE_1_TAPER)

    # M8 -1 pattern: M8 hole -1 ×4 about axis
    m8_1_pattern_axis = Axis((0, 0, 0), (0, 1, 0))
    for i in range(1, M8_1_PATTERN_COUNT):
        add(m8_hole_1.rotate(m8_1_pattern_axis, i * 360 / M8_1_PATTERN_COUNT))

    # Sketch6 → M8 -2 (add)
    with BuildSketch(Plane(origin=(0, 0, 0), x_dir=(1, 0, 0), z_dir=(0, 1, 0))):
        with Locations((-125, -250)):
            Circle(SKETCH6_R)
    extrude_m8_2 = extrude(amount=EXTRUDE_M8_2_DEPTH, taper=EXTRUDE_M8_2_TAPER)

    # M8 -2 pattern: M8 -2 ×4 about axis
    m8_2_pattern_axis = Axis((0, 0, 0), (0, 1, 0))
    for i in range(1, M8_2_PATTERN_COUNT):
        add(extrude_m8_2.rotate(m8_2_pattern_axis, i * 360 / M8_2_PATTERN_COUNT))

    # M8 -3: M8 -2 ×2 about axis
    pattern_circular_m8_3_axis = Axis((0, 0, 0), (0, -1, 0))
    for i in range(1, PATTERN_CIRCULAR_M8_3_COUNT):
        add(extrude_m8_2.rotate(pattern_circular_m8_3_axis, i * PATTERN_CIRCULAR_M8_3_ANGLE / (PATTERN_CIRCULAR_M8_3_COUNT - 1)))

    # M8 -3 copy 1 sketch → M8 -3 copy 1 (add)
    with BuildSketch(Plane(origin=(0, 0, 0), x_dir=(0.6004202253258852, 0, -0.7996846584870897), z_dir=(0, 1, 0))):
        with Locations((-125, -250)):
            Circle(PATTERN_CIRCULAR_M8_3_COPY_1_SKETCH_R)
    extrude(amount=PATTERN_CIRCULAR_M8_3_COPY_1_DEPTH, taper=PATTERN_CIRCULAR_M8_3_COPY_1_TAPER)

    # M8 -3 copy 2 sketch → M8 -3 copy 2 (add)
    with BuildSketch(Plane(origin=(0, 0, 0), x_dir=(-0.7996846584870896, 0, -0.6004202253258853), z_dir=(0, 1, 0))):
        with Locations((-125, -250)):
            Circle(PATTERN_CIRCULAR_M8_3_COPY_2_SKETCH_R)
    extrude(amount=PATTERN_CIRCULAR_M8_3_COPY_2_DEPTH, taper=PATTERN_CIRCULAR_M8_3_COPY_2_TAPER)

    # M8 -3 copy 3 sketch → M8 -3 copy 3 (add)
    with BuildSketch(Plane(origin=(0, 0, 0), x_dir=(-0.6004202253258853, 0, 0.7996846584870896), z_dir=(0, 1, 0))):
        with Locations((-125, -250)):
            Circle(PATTERN_CIRCULAR_M8_3_COPY_3_SKETCH_R)
    extrude(amount=PATTERN_CIRCULAR_M8_3_COPY_3_DEPTH, taper=PATTERN_CIRCULAR_M8_3_COPY_3_TAPER)

    # Sketch8 → cut center (cut, through all)
    with BuildSketch(Plane(origin=(0, 0, 0), x_dir=(1, 0, 0), z_dir=(0, 1, 0))):
        with BuildLine():
            Line((115.433963806, -199.937490231), (0, 0))
            Line((0, 0), (0, -180))
            Line((0, -180), (20, -180))
            Line((20, -180), (20, -230))
            ThreePointArc((20, -230), (69.365180469, -220.200980331), (115.433963806, -199.937490231))
        make_face()
        with BuildLine():
            Line((0, -180), (0, 0))
            Line((0, 0), (-115.433963806, -199.937490231))
            ThreePointArc((-115.433963806, -199.937490231), (-69.365180469, -220.200980331), (-20, -230))
            Line((-20, -230), (-20, -180))
            Line((-20, -180), (0, -180))
        make_face()
    cut_center = extrude(amount=-CUT_CENTER_DEPTH, mode=Mode.SUBTRACT)

    # CirPattern7: cut center ×6 about axis
    cirpattern7_axis = Axis((0, 0, 0), (0, 1, 0))
    for i in range(1, CIRPATTERN7_COUNT):
        add(cut_center.rotate(cirpattern7_axis, i * 360 / CIRPATTERN7_COUNT), mode=Mode.SUBTRACT)

    # Sketch15 → Cut-Extrude3 (cut, through all)
    with BuildSketch(Plane(origin=(0, -2, 0), x_dir=(-1, 0, 0), z_dir=(0, -1, 0))):
        with Locations((45.380035271, -59.166137501)):
            Rectangle(SKETCH15_W, SKETCH15_H)
        with Locations((0, 200)):
            Rectangle(SKETCH15_W_2, SKETCH15_H_2, mode=Mode.SUBTRACT)
    extrude(amount=-CUT_EXTRUDE3_DEPTH, mode=Mode.SUBTRACT)

    # Sketch16 → Boss-Extrude2 (add)
    with BuildSketch(Plane(origin=(0, 0, 0), x_dir=(1, 0, 0), z_dir=(0, 1, 0))):
        Polygon((-96, 252.660254038), (-96, 235.339745962), (-81, 244), align=None)
    extrude(amount=-BOSS_EXTRUDE2_DEPTH)

    # Sketch17 → Cut-Extrude4 (cut, through all)
    with BuildSketch(Plane(origin=(0, 0, 0), x_dir=(1, 0, 0), z_dir=(0, 1, 0))):
        Polygon((101, 244), (86, 252.660254038), (86, 235.339745962), align=None)
    extrude(amount=-CUT_EXTRUDE4_DEPTH, mode=Mode.SUBTRACT)

    # Sketch18 → Cut-Extrude5 (cut)
    with BuildSketch(Plane(origin=(0, 0, 0), x_dir=(1, 0, 0), z_dir=(0, 1, 0))):
        Circle(SKETCH18_R)
        Circle(SKETCH18_R_2, mode=Mode.SUBTRACT)
    extrude(amount=-CUT_EXTRUDE5_DEPTH, mode=Mode.SUBTRACT)


solid = part_17.part
